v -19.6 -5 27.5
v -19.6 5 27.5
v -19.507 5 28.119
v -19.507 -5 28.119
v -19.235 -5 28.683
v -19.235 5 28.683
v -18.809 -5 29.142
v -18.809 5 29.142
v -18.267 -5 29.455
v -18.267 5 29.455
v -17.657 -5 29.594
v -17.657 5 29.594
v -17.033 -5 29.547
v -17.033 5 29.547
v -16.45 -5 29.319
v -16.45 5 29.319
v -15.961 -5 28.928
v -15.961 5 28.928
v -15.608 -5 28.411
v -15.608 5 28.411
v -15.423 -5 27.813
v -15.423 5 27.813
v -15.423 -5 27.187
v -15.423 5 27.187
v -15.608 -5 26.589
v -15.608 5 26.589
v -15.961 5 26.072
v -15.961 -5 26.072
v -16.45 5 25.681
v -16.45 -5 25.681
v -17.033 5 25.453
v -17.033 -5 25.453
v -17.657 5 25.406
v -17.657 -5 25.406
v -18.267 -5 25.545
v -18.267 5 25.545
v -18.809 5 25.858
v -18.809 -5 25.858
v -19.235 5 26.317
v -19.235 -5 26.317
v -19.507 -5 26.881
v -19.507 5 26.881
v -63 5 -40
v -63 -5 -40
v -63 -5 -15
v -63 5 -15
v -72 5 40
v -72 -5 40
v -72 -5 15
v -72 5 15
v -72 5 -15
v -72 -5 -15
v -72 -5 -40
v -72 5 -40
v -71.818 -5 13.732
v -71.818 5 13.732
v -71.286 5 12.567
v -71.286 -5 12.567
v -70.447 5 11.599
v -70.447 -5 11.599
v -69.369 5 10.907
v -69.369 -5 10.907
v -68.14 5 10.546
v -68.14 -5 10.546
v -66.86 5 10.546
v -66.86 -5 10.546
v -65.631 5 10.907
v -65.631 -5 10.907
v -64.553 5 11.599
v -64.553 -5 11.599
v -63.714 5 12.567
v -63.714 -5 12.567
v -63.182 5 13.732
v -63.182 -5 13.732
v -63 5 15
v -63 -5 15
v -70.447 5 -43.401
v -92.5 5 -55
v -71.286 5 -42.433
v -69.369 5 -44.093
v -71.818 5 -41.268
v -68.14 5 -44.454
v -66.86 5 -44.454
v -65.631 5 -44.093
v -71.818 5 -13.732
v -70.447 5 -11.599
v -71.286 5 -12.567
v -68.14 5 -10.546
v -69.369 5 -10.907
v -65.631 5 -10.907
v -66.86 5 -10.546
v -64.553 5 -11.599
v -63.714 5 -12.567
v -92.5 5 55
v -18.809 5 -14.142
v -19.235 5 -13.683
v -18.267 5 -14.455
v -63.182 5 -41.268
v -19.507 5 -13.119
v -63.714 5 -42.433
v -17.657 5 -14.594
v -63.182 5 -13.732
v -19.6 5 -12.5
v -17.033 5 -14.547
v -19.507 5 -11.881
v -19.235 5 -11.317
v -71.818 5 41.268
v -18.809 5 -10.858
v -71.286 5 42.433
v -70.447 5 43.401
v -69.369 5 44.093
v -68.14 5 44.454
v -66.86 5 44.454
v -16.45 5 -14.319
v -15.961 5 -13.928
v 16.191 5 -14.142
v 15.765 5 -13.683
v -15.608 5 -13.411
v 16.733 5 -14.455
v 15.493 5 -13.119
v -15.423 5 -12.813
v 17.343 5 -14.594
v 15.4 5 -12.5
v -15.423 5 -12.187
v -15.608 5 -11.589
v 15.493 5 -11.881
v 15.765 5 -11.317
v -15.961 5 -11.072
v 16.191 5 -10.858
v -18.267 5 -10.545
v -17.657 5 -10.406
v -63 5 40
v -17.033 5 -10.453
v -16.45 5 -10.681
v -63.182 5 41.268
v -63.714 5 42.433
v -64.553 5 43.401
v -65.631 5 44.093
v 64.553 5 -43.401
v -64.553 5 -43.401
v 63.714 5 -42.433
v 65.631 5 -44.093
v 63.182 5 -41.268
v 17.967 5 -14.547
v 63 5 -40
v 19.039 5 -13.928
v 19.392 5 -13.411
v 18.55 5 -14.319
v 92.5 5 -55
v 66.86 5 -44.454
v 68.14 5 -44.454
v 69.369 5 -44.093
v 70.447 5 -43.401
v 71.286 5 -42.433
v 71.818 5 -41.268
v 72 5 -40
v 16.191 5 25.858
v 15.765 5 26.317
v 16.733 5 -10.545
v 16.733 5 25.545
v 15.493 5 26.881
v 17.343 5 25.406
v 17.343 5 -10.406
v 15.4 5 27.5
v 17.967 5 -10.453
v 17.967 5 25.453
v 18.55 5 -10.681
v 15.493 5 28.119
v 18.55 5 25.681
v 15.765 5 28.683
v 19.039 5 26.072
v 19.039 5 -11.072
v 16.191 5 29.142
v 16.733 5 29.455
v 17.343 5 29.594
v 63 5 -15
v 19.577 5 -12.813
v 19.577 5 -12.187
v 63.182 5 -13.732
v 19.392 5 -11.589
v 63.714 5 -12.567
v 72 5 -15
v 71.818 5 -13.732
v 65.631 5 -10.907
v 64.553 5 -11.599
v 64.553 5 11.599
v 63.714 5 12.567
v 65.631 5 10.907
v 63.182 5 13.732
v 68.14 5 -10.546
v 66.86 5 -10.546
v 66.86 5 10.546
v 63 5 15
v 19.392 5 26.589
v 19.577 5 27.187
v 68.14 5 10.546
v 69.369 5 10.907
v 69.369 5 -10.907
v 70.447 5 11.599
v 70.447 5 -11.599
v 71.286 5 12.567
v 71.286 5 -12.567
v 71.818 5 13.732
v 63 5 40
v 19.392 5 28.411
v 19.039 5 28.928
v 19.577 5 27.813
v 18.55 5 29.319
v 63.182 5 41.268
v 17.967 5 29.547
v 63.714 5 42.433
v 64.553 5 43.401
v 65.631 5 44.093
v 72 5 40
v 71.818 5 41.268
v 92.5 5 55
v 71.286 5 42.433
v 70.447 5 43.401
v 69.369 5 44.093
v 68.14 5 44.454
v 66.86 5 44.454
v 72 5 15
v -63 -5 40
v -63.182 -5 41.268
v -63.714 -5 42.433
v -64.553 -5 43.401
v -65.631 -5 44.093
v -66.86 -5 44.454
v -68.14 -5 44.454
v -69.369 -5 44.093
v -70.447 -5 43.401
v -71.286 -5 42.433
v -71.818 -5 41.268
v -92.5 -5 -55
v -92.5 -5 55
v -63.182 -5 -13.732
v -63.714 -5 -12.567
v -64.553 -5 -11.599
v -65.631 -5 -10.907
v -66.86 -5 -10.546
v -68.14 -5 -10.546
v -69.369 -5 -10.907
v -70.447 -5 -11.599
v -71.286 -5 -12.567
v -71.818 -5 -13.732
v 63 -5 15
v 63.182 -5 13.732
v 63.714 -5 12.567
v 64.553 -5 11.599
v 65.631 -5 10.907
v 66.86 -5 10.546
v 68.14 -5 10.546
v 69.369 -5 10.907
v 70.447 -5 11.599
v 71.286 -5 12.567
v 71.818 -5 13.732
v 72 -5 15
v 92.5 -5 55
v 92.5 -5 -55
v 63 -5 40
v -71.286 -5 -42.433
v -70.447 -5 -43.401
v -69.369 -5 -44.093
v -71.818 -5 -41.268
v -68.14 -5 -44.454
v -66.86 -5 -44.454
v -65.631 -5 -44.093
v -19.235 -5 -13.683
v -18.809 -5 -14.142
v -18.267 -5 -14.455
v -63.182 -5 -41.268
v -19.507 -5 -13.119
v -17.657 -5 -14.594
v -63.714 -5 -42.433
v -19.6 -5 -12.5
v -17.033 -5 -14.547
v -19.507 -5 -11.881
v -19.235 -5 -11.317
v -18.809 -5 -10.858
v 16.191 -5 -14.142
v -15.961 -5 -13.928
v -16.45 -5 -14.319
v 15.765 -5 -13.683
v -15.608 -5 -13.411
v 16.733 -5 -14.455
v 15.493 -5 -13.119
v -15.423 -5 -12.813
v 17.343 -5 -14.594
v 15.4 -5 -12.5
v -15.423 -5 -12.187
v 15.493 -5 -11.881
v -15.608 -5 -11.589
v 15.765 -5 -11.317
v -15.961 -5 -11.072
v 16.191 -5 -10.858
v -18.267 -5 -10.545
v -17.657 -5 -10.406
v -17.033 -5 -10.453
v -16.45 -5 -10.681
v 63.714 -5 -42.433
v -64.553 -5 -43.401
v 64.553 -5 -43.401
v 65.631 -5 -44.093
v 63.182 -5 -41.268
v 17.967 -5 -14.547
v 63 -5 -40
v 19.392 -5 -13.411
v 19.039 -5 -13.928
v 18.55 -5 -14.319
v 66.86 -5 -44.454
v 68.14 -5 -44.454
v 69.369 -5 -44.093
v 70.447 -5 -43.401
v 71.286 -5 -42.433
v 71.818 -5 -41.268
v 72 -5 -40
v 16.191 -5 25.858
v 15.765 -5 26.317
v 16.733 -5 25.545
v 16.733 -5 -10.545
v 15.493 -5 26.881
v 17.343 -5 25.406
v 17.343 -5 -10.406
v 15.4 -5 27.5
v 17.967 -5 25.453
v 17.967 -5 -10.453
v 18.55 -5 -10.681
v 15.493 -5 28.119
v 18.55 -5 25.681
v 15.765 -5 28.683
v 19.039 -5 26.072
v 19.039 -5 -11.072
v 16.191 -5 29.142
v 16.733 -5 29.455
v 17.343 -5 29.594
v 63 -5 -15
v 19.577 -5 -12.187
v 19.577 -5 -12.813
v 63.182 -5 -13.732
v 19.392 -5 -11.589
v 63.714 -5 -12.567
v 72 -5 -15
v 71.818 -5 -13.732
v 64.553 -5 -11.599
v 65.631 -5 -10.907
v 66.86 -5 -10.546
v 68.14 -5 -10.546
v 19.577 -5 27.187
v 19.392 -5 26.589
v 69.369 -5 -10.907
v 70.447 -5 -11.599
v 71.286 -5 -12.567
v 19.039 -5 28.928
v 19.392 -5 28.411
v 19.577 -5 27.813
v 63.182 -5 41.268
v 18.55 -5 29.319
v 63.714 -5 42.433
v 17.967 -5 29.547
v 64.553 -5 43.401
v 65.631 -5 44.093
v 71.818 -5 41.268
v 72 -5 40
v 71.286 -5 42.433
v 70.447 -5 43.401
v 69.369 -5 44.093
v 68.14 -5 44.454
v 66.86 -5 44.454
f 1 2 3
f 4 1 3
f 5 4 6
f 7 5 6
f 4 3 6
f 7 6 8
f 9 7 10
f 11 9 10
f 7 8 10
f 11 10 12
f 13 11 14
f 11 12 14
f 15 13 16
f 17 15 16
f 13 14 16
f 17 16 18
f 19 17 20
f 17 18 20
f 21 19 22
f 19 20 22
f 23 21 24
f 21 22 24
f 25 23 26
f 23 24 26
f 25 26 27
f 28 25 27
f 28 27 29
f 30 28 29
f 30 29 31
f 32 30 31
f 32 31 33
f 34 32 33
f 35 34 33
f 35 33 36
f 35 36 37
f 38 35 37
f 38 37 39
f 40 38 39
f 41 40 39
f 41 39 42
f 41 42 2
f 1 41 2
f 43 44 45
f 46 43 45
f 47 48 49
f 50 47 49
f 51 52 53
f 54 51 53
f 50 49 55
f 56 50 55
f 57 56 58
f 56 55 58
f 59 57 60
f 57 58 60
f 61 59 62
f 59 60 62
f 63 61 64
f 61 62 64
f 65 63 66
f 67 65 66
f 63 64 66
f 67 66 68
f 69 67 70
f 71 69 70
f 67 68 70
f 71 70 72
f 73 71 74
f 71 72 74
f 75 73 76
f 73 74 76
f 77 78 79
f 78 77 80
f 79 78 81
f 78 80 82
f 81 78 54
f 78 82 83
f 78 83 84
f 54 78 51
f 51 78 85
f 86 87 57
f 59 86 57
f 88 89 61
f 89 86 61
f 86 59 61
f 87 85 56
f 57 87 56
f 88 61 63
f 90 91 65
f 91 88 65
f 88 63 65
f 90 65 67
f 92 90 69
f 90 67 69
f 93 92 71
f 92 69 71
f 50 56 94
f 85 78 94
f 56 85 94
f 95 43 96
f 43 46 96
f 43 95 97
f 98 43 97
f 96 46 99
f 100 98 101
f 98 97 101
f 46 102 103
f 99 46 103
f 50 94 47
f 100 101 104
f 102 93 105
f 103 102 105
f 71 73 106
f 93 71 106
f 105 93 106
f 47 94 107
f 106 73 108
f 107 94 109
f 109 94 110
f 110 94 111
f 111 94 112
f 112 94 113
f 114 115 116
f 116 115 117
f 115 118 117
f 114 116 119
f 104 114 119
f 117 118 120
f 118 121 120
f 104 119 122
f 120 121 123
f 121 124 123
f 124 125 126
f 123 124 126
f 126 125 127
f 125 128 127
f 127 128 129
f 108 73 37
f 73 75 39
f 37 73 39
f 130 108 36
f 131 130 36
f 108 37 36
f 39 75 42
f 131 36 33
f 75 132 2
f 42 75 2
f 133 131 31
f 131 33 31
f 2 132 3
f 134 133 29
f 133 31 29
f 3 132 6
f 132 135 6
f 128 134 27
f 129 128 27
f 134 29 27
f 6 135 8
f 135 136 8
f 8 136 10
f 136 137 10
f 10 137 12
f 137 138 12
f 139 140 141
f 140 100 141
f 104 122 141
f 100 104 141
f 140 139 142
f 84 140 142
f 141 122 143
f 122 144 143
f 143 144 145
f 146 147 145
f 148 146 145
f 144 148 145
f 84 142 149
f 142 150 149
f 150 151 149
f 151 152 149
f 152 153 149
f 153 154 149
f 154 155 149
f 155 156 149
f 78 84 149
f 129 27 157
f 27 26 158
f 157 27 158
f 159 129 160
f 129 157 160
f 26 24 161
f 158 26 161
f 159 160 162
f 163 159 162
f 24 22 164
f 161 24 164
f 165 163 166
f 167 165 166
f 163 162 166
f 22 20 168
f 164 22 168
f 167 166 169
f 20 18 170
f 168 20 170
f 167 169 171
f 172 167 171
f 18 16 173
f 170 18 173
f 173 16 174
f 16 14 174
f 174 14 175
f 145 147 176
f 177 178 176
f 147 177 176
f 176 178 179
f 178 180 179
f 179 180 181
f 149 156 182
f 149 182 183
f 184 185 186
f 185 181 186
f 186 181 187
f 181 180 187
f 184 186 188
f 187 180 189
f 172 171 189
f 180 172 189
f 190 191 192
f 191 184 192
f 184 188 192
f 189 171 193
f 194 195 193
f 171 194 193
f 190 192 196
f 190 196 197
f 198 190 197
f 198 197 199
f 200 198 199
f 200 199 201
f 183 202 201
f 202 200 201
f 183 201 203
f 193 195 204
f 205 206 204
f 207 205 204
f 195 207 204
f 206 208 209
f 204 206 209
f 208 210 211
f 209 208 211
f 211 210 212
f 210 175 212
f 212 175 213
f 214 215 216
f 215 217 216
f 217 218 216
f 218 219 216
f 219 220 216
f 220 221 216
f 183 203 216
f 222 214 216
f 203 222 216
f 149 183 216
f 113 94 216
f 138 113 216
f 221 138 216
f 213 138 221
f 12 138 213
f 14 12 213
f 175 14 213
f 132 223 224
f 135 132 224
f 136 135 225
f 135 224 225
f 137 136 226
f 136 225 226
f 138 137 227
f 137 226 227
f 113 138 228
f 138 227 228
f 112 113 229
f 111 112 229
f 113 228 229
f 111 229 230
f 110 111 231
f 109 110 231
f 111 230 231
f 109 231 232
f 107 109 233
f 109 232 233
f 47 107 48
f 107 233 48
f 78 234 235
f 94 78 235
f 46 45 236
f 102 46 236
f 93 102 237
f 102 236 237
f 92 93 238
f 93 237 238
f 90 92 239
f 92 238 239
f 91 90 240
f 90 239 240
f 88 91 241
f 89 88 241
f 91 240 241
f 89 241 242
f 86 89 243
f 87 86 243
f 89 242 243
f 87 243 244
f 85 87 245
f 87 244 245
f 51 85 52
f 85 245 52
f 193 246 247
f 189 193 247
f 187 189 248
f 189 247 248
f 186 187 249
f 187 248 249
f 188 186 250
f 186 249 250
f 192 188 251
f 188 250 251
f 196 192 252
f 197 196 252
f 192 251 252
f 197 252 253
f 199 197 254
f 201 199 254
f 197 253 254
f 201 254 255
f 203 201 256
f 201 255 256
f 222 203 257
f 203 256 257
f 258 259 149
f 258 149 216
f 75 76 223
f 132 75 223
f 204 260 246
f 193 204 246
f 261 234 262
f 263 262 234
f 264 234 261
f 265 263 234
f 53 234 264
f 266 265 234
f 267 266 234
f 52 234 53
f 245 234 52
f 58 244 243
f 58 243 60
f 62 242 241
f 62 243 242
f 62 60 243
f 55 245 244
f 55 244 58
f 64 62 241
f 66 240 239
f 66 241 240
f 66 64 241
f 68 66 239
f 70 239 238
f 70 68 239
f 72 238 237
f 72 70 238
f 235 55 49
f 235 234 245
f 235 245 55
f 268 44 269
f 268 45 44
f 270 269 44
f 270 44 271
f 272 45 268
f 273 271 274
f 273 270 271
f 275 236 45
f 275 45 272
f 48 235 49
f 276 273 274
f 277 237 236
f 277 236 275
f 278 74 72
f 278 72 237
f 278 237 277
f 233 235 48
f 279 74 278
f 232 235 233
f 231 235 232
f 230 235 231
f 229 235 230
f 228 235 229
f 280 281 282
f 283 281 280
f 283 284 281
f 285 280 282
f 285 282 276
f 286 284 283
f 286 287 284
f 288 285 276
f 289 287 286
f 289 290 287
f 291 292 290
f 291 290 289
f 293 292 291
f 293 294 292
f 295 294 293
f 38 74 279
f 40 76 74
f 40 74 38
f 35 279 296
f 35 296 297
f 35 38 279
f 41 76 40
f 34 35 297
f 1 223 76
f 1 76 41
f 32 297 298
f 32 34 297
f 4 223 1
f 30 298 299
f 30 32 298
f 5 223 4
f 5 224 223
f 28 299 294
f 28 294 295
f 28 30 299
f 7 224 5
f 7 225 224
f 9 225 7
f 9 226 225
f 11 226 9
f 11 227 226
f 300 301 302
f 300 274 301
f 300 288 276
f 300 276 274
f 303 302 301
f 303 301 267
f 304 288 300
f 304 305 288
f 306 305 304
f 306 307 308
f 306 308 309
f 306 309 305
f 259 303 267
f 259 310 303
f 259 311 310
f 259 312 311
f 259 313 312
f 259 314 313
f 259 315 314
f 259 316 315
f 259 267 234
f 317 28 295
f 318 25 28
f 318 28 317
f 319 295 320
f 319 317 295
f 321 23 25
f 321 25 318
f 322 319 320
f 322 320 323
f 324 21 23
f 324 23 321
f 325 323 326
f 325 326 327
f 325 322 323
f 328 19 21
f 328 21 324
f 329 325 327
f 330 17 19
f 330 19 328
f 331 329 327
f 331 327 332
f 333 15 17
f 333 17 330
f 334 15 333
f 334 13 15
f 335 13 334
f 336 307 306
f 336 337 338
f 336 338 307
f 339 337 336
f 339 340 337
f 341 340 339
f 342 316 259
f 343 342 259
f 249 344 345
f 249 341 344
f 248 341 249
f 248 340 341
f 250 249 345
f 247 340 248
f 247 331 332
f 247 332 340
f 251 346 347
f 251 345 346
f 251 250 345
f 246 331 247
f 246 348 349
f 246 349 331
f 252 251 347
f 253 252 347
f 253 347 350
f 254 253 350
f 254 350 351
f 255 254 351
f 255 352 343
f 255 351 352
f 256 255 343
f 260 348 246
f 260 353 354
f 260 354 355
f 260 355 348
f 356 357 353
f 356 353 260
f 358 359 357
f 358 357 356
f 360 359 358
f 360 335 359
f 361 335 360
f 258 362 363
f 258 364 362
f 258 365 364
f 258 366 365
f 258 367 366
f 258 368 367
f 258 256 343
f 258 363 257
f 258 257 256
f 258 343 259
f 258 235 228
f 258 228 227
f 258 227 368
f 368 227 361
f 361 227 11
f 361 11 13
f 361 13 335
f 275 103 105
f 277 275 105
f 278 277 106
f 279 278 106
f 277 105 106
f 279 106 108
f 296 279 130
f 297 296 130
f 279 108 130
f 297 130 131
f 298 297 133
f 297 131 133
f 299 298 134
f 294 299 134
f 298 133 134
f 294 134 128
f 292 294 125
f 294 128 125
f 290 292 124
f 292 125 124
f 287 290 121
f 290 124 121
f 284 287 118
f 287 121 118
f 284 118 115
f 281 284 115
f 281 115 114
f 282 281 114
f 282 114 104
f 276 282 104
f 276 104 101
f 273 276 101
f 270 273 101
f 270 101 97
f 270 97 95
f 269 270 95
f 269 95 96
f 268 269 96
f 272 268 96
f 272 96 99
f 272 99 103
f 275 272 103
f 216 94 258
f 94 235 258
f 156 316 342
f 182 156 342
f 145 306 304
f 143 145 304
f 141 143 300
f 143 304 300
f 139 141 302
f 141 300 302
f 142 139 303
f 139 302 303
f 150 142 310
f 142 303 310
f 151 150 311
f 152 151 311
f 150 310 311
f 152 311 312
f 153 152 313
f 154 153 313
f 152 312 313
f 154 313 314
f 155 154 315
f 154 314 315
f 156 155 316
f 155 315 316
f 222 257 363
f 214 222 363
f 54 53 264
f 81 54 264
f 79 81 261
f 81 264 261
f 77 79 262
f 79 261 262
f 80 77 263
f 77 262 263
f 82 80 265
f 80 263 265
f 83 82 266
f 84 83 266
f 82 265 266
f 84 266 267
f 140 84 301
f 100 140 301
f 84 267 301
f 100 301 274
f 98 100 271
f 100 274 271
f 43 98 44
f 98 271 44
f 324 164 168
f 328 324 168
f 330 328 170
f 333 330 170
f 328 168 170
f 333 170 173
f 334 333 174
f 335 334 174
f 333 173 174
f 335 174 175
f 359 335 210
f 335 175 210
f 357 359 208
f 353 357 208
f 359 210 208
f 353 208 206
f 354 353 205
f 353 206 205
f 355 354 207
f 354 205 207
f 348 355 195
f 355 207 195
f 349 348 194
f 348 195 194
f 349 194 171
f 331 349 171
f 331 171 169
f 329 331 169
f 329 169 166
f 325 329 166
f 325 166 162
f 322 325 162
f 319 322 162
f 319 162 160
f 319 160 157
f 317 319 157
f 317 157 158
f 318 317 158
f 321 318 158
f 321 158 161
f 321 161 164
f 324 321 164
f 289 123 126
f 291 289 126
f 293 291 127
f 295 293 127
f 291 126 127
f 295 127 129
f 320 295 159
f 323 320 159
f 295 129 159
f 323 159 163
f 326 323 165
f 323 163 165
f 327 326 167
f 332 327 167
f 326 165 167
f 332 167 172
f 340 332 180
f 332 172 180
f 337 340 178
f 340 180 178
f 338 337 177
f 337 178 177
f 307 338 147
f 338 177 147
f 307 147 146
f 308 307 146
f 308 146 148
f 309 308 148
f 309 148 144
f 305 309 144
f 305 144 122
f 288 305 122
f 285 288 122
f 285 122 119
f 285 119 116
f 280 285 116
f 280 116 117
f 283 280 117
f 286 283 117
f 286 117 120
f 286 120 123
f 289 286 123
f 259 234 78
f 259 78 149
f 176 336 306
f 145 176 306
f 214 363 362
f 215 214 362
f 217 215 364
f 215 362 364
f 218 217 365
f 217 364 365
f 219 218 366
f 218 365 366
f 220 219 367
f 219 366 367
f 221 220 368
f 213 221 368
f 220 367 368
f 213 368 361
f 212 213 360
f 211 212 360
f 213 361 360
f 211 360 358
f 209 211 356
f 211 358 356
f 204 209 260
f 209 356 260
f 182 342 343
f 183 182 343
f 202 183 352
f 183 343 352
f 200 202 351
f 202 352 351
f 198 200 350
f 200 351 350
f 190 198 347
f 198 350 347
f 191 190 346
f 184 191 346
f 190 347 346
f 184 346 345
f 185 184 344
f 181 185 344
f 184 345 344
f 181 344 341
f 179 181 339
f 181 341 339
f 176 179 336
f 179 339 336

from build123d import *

# Parameters (mm, degrees)
F0_W     = 185
F0_H     = 110
F1_DEPTH = 5
F3_DEPTH = 10.001
F5_D     = 4.2
F5_DEPTH = 17.4
F5_TIP   = 1.2618073


with BuildPart() as f1:
    # F0 (on Front) → F1 (new body, symmetric)
    with BuildSketch(Plane.XZ):
        Rectangle(F0_W, F0_H)
    extrude(amount=F1_DEPTH, both=True)

    # F2 (on face) → F3 (cut, through all)
    with BuildSketch(Plane.XZ.offset(5)):
        with BuildLine():
            ThreePointArc((-63, 40), (-67.5, 44.5), (-72, 40))
            Line((-72, 40), (-72, 15))
            ThreePointArc((-72, 15), (-67.5, 10.5), (-63, 15))
            Line((-63, 15), (-63, 40))
        make_face()
        with BuildLine():
            ThreePointArc((-63, -15), (-67.5, -10.5), (-72, -15))
            Line((-72, -15), (-72, -40))
            ThreePointArc((-72, -40), (-67.5, -44.5), (-63, -40))
            Line((-63, -40), (-63, -15))
        make_face()
        with BuildLine():
            ThreePointArc((72, 40), (67.5, 44.5), (63, 40))
            Line((63, 40), (63, 15))
            ThreePointArc((63, 15), (67.5, 10.5), (72, 15))
            Line((72, 15), (72, 40))
        make_face()
        with BuildLine():
            ThreePointArc((72, -15), (67.5, -10.5), (63, -15))
            Line((63, -15), (63, -40))
            ThreePointArc((63, -40), (67.5, -44.5), (72, -40))
            Line((72, -40), (72, -15))
        make_face()
    extrude(amount=-F3_DEPTH, mode=Mode.SUBTRACT)

    # F5
    with Locations(Plane.XZ.offset(5)):
        with Locations((-17.5, 27.5), (-17.5, -12.5), (17.5, 27.5), (17.5, -12.5)):
            Hole(F5_D / 2, depth=F5_DEPTH)
            with Locations((0, 0, -(F5_DEPTH + F5_TIP / 2))):  # 118° drill point
                Cone(0, F5_D / 2, F5_TIP, mode=Mode.SUBTRACT)


solid = f1.part
